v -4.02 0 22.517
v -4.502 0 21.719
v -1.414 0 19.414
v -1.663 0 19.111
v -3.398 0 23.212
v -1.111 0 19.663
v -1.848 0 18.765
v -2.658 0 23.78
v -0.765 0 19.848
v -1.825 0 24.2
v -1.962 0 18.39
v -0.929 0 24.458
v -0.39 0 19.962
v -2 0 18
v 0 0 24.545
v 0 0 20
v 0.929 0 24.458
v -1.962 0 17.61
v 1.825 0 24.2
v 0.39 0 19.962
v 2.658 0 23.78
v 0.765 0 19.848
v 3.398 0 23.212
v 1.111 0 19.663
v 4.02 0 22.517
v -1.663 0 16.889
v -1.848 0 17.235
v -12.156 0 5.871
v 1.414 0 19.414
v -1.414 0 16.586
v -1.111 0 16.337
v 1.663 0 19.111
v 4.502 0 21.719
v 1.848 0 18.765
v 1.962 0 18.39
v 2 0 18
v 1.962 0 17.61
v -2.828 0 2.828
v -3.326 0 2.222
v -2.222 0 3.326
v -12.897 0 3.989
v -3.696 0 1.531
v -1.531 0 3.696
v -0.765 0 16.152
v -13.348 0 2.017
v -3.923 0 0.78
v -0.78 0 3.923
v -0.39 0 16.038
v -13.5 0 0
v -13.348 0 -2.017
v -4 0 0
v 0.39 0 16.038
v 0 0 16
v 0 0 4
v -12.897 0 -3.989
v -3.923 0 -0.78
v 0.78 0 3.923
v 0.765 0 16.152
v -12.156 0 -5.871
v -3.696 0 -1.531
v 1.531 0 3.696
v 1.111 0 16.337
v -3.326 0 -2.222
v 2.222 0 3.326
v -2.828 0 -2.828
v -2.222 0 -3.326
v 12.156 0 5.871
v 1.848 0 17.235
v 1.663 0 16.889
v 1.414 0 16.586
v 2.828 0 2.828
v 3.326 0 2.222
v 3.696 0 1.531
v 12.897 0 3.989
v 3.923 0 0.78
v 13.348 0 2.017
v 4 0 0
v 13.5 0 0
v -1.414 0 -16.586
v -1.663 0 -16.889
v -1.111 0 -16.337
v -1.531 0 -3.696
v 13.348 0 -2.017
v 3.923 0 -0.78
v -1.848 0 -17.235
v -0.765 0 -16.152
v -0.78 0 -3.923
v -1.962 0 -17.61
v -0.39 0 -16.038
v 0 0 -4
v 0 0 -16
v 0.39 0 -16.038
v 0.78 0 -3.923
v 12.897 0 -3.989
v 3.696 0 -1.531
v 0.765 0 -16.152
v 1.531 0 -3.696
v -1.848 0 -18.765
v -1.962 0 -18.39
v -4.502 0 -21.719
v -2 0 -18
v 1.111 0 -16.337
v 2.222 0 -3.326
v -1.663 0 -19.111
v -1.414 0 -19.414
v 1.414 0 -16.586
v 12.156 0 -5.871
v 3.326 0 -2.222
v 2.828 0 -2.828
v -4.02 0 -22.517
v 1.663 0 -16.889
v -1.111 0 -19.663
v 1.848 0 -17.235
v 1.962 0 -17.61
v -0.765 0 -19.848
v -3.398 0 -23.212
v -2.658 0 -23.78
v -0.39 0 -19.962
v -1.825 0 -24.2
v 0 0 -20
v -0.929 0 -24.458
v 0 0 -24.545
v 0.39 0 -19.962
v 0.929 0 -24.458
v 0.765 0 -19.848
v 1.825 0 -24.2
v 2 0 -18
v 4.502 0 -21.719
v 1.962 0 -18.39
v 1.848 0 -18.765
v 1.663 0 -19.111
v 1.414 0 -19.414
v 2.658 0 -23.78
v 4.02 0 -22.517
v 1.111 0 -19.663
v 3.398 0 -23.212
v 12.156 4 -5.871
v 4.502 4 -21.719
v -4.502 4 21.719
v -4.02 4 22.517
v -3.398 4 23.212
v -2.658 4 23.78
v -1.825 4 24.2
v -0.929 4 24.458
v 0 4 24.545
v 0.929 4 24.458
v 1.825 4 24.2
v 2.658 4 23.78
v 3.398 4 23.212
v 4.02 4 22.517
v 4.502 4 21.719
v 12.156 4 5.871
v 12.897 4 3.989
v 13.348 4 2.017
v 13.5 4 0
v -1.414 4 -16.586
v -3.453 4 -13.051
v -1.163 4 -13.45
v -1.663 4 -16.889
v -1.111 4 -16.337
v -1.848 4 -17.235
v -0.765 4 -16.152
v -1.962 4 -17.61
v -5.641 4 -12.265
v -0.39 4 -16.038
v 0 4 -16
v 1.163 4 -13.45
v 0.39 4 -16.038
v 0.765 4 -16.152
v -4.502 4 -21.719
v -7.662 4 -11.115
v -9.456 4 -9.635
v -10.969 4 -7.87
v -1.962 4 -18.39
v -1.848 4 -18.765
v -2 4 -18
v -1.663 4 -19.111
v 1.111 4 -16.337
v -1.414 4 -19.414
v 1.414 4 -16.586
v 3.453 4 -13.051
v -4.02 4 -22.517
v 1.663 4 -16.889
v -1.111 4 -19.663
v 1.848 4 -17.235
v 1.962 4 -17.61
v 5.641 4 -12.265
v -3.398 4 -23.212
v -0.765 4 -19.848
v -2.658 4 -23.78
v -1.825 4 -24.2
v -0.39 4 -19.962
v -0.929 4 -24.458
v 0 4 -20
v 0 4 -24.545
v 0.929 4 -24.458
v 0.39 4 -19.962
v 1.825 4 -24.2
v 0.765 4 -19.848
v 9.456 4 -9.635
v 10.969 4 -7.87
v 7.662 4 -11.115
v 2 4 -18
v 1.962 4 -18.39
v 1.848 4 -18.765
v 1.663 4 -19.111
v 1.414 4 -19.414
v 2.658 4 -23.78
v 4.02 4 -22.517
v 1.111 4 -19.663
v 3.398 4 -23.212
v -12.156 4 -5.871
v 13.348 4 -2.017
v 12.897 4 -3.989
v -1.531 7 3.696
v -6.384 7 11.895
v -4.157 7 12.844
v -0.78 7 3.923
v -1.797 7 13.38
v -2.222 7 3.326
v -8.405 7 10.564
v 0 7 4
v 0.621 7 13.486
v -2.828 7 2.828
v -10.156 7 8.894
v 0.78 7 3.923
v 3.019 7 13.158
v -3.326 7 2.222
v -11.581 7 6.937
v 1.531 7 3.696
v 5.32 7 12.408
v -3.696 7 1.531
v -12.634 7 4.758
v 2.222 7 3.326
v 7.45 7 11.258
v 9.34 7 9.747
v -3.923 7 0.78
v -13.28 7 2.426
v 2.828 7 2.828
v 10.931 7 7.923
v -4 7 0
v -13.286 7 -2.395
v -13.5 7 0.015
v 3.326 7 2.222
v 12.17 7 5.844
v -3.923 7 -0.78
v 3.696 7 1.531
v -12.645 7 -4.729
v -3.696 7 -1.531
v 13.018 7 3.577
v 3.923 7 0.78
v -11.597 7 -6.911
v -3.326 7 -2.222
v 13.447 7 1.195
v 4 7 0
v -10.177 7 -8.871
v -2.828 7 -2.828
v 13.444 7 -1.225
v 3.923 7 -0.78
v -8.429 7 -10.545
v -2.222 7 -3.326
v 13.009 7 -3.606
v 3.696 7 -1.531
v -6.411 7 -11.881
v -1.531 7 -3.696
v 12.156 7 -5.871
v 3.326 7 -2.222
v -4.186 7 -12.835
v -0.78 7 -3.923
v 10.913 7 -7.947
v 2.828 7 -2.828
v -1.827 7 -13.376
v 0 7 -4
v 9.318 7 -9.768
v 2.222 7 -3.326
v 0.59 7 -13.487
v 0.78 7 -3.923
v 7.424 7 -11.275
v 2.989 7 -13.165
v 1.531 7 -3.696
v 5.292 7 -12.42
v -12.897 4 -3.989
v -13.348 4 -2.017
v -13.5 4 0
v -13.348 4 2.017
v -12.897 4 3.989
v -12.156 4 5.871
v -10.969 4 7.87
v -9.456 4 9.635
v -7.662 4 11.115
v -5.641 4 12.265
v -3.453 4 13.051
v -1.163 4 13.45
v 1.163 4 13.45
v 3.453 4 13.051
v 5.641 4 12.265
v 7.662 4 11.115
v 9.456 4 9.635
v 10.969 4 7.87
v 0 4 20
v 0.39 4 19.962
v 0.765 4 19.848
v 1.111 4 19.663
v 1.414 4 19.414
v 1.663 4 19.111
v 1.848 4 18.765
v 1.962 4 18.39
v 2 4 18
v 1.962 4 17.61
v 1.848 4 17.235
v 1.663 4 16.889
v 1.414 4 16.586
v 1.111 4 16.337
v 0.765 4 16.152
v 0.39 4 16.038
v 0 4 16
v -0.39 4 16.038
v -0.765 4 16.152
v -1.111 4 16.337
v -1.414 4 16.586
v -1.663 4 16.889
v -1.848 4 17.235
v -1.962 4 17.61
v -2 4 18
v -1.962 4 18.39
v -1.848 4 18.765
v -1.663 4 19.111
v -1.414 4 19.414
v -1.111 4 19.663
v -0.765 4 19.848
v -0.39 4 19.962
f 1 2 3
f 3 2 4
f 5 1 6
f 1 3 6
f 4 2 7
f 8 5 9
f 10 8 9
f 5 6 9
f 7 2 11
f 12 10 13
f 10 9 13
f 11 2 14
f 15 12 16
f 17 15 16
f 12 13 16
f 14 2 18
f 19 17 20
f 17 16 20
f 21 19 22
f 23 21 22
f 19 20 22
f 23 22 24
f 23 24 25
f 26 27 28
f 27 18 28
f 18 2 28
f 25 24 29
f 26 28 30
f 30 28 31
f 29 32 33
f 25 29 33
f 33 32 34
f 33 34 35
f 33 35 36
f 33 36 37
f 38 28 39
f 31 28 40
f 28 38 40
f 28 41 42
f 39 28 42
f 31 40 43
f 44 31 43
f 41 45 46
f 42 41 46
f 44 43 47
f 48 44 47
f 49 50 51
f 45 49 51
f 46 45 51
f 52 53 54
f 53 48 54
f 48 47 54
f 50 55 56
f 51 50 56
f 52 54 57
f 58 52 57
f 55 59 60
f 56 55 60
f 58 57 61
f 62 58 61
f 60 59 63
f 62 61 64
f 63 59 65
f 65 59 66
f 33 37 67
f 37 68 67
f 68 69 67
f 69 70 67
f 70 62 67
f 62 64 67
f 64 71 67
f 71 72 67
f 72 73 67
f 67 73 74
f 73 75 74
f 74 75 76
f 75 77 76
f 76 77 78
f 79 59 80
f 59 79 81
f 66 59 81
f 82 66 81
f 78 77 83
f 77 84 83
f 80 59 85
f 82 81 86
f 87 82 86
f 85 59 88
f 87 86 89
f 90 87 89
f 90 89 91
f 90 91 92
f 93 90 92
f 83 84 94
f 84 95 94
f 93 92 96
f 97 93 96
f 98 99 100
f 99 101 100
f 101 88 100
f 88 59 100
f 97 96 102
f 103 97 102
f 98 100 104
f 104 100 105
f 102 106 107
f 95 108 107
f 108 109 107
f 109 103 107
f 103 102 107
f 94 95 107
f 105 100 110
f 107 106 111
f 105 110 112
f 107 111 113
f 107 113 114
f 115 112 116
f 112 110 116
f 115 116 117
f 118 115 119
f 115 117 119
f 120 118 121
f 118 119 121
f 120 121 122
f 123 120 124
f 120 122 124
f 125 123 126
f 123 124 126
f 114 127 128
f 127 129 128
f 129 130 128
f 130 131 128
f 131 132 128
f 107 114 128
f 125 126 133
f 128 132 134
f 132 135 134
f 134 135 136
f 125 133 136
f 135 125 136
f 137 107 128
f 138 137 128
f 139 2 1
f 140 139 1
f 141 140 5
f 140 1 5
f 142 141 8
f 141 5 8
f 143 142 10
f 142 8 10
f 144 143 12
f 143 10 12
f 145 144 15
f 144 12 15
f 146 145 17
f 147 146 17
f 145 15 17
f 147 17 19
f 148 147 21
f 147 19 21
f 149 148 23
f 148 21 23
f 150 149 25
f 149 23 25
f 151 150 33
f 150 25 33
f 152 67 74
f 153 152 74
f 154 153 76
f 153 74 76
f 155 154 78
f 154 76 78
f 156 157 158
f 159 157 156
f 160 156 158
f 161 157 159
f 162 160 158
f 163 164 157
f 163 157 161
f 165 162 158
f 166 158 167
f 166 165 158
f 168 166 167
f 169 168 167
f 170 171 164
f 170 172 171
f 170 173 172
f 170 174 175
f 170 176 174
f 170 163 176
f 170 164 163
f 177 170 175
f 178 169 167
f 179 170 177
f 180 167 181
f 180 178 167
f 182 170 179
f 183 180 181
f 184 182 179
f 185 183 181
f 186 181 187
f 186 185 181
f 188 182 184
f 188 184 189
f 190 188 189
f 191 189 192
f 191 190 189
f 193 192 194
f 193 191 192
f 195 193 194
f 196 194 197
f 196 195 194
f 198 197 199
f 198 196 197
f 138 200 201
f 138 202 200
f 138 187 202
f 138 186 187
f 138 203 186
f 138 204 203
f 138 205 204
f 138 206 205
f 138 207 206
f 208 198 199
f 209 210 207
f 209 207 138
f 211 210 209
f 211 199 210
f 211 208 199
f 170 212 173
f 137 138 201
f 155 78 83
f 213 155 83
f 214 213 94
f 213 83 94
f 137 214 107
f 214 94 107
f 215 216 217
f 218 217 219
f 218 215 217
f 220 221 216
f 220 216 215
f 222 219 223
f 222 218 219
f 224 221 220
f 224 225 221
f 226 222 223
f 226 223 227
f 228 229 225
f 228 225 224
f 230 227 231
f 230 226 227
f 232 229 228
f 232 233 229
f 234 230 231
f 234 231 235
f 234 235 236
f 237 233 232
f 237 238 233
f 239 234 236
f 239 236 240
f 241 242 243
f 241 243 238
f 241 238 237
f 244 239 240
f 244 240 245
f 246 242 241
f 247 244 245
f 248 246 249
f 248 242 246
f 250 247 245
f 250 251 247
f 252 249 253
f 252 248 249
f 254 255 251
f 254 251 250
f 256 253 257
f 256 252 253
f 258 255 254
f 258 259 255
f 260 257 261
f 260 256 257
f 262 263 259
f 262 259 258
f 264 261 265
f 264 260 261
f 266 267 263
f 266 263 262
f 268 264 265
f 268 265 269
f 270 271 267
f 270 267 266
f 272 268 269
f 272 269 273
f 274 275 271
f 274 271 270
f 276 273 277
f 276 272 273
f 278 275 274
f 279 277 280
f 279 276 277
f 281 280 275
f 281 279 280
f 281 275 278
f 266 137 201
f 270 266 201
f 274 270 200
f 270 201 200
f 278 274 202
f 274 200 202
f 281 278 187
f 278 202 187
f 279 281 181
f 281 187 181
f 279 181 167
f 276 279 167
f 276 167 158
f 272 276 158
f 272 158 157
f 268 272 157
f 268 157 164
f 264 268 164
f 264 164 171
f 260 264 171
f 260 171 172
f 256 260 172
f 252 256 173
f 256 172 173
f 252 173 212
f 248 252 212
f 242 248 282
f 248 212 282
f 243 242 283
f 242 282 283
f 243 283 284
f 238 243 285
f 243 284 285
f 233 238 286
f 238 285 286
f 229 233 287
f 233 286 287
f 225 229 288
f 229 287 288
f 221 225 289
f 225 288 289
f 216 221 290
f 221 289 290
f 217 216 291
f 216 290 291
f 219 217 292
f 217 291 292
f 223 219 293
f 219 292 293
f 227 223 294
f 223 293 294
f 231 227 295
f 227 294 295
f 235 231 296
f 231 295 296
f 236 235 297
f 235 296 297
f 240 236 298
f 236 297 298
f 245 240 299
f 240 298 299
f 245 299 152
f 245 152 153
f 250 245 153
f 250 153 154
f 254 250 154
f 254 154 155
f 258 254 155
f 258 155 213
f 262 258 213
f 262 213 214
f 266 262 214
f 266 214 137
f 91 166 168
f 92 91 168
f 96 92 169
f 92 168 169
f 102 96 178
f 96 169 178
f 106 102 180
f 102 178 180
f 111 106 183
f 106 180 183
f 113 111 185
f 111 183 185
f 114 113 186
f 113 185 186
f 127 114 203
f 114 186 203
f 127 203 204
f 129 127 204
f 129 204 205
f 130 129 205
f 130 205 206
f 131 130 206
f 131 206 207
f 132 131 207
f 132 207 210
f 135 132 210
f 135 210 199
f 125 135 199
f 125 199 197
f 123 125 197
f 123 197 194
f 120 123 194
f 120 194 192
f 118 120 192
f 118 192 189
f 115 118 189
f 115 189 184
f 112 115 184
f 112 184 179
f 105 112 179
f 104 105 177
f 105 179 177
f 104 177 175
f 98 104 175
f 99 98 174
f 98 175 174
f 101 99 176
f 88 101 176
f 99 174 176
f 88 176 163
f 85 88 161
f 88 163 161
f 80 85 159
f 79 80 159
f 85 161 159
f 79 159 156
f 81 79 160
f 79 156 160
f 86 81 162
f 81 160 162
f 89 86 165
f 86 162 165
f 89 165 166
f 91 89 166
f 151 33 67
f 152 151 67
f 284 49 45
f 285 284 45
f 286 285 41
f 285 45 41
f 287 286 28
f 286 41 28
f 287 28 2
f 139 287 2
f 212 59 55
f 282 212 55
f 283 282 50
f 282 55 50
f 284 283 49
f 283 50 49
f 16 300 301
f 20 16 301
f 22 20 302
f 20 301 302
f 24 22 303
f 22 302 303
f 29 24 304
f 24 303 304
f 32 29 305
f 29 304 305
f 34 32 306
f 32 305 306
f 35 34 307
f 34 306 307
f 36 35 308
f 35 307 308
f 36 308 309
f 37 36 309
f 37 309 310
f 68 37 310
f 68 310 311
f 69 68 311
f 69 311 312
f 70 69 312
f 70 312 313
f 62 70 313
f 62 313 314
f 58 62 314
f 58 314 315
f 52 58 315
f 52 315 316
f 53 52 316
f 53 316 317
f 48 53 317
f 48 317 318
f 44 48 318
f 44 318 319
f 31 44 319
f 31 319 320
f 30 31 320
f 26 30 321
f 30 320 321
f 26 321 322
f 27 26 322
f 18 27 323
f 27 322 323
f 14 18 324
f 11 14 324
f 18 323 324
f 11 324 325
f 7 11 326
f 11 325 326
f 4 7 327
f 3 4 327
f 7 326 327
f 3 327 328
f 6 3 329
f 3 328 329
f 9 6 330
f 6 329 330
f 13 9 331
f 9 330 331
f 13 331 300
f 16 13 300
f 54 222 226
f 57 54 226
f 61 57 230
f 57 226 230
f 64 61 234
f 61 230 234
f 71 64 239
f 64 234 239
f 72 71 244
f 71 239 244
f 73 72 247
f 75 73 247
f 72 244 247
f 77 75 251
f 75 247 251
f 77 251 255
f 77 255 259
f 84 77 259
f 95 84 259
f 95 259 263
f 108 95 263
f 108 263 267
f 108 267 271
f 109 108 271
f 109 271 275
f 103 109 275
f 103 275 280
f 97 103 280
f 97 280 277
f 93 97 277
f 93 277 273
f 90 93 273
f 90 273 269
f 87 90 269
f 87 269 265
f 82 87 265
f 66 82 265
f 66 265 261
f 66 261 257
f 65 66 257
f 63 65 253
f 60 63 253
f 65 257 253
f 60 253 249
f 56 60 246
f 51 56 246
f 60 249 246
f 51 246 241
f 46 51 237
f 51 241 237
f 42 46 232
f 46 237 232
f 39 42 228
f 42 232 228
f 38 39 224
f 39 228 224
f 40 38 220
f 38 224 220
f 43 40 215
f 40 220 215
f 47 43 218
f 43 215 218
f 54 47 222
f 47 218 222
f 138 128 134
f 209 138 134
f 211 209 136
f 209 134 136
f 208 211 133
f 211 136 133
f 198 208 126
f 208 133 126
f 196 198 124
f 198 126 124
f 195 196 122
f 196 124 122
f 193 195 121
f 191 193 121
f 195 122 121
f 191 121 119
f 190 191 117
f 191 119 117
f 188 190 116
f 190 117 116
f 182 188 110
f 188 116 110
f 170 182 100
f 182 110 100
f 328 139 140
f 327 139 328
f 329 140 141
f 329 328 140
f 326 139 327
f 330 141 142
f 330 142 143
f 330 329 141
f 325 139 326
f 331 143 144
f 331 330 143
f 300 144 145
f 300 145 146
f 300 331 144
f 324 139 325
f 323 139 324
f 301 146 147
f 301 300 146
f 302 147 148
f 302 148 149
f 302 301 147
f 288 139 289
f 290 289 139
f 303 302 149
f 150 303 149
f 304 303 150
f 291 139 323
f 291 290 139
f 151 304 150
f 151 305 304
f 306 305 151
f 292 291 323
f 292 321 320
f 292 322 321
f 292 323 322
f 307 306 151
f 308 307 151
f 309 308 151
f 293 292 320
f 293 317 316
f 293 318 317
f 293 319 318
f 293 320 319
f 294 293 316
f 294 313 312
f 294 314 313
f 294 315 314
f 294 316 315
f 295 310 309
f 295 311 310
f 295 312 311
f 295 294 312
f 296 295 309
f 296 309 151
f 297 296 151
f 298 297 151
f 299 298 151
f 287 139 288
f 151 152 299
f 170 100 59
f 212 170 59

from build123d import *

# Parameters (mm, degrees)
BOSS_EXTRUDE1_DEPTH = 4
SKETCH2_R           = 2
CUT_EXTRUDE1_DEPTH  = 29.296371725
SKETCH3_R           = 13.5
BOSS_EXTRUDE2_DEPTH = 3
SKETCH4_R           = 4
CUT_EXTRUDE2_DEPTH  = 29.87359785


with BuildPart() as part:
    # Sketch1 → Boss-Extrude1 (new body)
    with BuildSketch(Plane(origin=(0, 0, 0), x_dir=(1, 0, 0), z_dir=(0, 1, 0))):
        with BuildLine():
            ThreePointArc((13.5, 0), (13.159823391, 3.011486067), (12.156437284, 5.871203671))
            ThreePointArc((12.156437284, 5.871203671), (0, 13.5), (-12.156437284, 5.871203671))
            ThreePointArc((-12.156437284, 5.871203671), (-13.159823391, 3.011486067), (-13.5, 0))
            Line((-13.5, 0), (13.5, 0))
        make_face()
        with BuildLine():
            ThreePointArc((12.156437284, -5.871203671), (13.159823391, -3.011486067), (13.5, 0))
            Line((13.5, 0), (-13.5, 0))
            ThreePointArc((-13.5, 0), (-13.159823391, -3.011486067), (-12.156437284, -5.871203671))
            ThreePointArc((-12.156437284, -5.871203671), (0, -13.5), (12.156437284, -5.871203671))
        make_face()
        with BuildLine():
            ThreePointArc((-12.156437284, 5.871203671), (0, 13.5), (12.156437284, 5.871203671))
            Line((12.156437284, 5.871203671), (4.502384179, 21.719064136))
            ThreePointArc((4.502384179, 21.719064136), (0, 24.544544258), (-4.502384179, 21.719064136))
            Line((-4.502384179, 21.719064136), (-12.156437284, 5.871203671))
        make_face()
        with BuildLine():
            Line((4.502384179, -21.719064136), (12.156437284, -5.871203671))
            ThreePointArc((12.156437284, -5.871203671), (0, -13.5), (-12.156437284, -5.871203671))
            Line((-12.156437284, -5.871203671), (-4.502384179, -21.719064136))
            ThreePointArc((-4.502384179, -21.719064136), (0, -24.544544258), (4.502384179, -21.719064136))
        make_face()
    extrude(amount=BOSS_EXTRUDE1_DEPTH)

    # Sketch2 → Cut-Extrude1 (cut, through all)
    with BuildSketch(Plane(origin=(0, 4, 0), x_dir=(1, 0, 0), z_dir=(0, 1, 0))):
        with Locations(Location((0, -18, 0), (0, 0, 270))):
            Circle(SKETCH2_R)
        with Locations(Location((0, 18, 0), (0, 0, 270))):
            Circle(SKETCH2_R)
    extrude(amount=-CUT_EXTRUDE1_DEPTH, mode=Mode.SUBTRACT)

    # Sketch3 → Boss-Extrude2 (add)
    with BuildSketch(Plane(origin=(0, 4, 0), x_dir=(1, 0, 0), z_dir=(0, 1, 0))):
        with Locations(Location((0, 0, 0), (0, 0, 25.779183858))):
            Circle(SKETCH3_R)
    extrude(amount=BOSS_EXTRUDE2_DEPTH)

    # Sketch4 → Cut-Extrude2 (cut, through all)
    with BuildSketch(Plane(origin=(0, 7, 0), x_dir=(1, 0, 0), z_dir=(0, 1, 0))):
        with Locations(Location((0, 0, 0), (0, 0, 270))):
            Circle(SKETCH4_R)
    extrude(amount=-CUT_EXTRUDE2_DEPTH, mode=Mode.SUBTRACT)


solid = part.part
